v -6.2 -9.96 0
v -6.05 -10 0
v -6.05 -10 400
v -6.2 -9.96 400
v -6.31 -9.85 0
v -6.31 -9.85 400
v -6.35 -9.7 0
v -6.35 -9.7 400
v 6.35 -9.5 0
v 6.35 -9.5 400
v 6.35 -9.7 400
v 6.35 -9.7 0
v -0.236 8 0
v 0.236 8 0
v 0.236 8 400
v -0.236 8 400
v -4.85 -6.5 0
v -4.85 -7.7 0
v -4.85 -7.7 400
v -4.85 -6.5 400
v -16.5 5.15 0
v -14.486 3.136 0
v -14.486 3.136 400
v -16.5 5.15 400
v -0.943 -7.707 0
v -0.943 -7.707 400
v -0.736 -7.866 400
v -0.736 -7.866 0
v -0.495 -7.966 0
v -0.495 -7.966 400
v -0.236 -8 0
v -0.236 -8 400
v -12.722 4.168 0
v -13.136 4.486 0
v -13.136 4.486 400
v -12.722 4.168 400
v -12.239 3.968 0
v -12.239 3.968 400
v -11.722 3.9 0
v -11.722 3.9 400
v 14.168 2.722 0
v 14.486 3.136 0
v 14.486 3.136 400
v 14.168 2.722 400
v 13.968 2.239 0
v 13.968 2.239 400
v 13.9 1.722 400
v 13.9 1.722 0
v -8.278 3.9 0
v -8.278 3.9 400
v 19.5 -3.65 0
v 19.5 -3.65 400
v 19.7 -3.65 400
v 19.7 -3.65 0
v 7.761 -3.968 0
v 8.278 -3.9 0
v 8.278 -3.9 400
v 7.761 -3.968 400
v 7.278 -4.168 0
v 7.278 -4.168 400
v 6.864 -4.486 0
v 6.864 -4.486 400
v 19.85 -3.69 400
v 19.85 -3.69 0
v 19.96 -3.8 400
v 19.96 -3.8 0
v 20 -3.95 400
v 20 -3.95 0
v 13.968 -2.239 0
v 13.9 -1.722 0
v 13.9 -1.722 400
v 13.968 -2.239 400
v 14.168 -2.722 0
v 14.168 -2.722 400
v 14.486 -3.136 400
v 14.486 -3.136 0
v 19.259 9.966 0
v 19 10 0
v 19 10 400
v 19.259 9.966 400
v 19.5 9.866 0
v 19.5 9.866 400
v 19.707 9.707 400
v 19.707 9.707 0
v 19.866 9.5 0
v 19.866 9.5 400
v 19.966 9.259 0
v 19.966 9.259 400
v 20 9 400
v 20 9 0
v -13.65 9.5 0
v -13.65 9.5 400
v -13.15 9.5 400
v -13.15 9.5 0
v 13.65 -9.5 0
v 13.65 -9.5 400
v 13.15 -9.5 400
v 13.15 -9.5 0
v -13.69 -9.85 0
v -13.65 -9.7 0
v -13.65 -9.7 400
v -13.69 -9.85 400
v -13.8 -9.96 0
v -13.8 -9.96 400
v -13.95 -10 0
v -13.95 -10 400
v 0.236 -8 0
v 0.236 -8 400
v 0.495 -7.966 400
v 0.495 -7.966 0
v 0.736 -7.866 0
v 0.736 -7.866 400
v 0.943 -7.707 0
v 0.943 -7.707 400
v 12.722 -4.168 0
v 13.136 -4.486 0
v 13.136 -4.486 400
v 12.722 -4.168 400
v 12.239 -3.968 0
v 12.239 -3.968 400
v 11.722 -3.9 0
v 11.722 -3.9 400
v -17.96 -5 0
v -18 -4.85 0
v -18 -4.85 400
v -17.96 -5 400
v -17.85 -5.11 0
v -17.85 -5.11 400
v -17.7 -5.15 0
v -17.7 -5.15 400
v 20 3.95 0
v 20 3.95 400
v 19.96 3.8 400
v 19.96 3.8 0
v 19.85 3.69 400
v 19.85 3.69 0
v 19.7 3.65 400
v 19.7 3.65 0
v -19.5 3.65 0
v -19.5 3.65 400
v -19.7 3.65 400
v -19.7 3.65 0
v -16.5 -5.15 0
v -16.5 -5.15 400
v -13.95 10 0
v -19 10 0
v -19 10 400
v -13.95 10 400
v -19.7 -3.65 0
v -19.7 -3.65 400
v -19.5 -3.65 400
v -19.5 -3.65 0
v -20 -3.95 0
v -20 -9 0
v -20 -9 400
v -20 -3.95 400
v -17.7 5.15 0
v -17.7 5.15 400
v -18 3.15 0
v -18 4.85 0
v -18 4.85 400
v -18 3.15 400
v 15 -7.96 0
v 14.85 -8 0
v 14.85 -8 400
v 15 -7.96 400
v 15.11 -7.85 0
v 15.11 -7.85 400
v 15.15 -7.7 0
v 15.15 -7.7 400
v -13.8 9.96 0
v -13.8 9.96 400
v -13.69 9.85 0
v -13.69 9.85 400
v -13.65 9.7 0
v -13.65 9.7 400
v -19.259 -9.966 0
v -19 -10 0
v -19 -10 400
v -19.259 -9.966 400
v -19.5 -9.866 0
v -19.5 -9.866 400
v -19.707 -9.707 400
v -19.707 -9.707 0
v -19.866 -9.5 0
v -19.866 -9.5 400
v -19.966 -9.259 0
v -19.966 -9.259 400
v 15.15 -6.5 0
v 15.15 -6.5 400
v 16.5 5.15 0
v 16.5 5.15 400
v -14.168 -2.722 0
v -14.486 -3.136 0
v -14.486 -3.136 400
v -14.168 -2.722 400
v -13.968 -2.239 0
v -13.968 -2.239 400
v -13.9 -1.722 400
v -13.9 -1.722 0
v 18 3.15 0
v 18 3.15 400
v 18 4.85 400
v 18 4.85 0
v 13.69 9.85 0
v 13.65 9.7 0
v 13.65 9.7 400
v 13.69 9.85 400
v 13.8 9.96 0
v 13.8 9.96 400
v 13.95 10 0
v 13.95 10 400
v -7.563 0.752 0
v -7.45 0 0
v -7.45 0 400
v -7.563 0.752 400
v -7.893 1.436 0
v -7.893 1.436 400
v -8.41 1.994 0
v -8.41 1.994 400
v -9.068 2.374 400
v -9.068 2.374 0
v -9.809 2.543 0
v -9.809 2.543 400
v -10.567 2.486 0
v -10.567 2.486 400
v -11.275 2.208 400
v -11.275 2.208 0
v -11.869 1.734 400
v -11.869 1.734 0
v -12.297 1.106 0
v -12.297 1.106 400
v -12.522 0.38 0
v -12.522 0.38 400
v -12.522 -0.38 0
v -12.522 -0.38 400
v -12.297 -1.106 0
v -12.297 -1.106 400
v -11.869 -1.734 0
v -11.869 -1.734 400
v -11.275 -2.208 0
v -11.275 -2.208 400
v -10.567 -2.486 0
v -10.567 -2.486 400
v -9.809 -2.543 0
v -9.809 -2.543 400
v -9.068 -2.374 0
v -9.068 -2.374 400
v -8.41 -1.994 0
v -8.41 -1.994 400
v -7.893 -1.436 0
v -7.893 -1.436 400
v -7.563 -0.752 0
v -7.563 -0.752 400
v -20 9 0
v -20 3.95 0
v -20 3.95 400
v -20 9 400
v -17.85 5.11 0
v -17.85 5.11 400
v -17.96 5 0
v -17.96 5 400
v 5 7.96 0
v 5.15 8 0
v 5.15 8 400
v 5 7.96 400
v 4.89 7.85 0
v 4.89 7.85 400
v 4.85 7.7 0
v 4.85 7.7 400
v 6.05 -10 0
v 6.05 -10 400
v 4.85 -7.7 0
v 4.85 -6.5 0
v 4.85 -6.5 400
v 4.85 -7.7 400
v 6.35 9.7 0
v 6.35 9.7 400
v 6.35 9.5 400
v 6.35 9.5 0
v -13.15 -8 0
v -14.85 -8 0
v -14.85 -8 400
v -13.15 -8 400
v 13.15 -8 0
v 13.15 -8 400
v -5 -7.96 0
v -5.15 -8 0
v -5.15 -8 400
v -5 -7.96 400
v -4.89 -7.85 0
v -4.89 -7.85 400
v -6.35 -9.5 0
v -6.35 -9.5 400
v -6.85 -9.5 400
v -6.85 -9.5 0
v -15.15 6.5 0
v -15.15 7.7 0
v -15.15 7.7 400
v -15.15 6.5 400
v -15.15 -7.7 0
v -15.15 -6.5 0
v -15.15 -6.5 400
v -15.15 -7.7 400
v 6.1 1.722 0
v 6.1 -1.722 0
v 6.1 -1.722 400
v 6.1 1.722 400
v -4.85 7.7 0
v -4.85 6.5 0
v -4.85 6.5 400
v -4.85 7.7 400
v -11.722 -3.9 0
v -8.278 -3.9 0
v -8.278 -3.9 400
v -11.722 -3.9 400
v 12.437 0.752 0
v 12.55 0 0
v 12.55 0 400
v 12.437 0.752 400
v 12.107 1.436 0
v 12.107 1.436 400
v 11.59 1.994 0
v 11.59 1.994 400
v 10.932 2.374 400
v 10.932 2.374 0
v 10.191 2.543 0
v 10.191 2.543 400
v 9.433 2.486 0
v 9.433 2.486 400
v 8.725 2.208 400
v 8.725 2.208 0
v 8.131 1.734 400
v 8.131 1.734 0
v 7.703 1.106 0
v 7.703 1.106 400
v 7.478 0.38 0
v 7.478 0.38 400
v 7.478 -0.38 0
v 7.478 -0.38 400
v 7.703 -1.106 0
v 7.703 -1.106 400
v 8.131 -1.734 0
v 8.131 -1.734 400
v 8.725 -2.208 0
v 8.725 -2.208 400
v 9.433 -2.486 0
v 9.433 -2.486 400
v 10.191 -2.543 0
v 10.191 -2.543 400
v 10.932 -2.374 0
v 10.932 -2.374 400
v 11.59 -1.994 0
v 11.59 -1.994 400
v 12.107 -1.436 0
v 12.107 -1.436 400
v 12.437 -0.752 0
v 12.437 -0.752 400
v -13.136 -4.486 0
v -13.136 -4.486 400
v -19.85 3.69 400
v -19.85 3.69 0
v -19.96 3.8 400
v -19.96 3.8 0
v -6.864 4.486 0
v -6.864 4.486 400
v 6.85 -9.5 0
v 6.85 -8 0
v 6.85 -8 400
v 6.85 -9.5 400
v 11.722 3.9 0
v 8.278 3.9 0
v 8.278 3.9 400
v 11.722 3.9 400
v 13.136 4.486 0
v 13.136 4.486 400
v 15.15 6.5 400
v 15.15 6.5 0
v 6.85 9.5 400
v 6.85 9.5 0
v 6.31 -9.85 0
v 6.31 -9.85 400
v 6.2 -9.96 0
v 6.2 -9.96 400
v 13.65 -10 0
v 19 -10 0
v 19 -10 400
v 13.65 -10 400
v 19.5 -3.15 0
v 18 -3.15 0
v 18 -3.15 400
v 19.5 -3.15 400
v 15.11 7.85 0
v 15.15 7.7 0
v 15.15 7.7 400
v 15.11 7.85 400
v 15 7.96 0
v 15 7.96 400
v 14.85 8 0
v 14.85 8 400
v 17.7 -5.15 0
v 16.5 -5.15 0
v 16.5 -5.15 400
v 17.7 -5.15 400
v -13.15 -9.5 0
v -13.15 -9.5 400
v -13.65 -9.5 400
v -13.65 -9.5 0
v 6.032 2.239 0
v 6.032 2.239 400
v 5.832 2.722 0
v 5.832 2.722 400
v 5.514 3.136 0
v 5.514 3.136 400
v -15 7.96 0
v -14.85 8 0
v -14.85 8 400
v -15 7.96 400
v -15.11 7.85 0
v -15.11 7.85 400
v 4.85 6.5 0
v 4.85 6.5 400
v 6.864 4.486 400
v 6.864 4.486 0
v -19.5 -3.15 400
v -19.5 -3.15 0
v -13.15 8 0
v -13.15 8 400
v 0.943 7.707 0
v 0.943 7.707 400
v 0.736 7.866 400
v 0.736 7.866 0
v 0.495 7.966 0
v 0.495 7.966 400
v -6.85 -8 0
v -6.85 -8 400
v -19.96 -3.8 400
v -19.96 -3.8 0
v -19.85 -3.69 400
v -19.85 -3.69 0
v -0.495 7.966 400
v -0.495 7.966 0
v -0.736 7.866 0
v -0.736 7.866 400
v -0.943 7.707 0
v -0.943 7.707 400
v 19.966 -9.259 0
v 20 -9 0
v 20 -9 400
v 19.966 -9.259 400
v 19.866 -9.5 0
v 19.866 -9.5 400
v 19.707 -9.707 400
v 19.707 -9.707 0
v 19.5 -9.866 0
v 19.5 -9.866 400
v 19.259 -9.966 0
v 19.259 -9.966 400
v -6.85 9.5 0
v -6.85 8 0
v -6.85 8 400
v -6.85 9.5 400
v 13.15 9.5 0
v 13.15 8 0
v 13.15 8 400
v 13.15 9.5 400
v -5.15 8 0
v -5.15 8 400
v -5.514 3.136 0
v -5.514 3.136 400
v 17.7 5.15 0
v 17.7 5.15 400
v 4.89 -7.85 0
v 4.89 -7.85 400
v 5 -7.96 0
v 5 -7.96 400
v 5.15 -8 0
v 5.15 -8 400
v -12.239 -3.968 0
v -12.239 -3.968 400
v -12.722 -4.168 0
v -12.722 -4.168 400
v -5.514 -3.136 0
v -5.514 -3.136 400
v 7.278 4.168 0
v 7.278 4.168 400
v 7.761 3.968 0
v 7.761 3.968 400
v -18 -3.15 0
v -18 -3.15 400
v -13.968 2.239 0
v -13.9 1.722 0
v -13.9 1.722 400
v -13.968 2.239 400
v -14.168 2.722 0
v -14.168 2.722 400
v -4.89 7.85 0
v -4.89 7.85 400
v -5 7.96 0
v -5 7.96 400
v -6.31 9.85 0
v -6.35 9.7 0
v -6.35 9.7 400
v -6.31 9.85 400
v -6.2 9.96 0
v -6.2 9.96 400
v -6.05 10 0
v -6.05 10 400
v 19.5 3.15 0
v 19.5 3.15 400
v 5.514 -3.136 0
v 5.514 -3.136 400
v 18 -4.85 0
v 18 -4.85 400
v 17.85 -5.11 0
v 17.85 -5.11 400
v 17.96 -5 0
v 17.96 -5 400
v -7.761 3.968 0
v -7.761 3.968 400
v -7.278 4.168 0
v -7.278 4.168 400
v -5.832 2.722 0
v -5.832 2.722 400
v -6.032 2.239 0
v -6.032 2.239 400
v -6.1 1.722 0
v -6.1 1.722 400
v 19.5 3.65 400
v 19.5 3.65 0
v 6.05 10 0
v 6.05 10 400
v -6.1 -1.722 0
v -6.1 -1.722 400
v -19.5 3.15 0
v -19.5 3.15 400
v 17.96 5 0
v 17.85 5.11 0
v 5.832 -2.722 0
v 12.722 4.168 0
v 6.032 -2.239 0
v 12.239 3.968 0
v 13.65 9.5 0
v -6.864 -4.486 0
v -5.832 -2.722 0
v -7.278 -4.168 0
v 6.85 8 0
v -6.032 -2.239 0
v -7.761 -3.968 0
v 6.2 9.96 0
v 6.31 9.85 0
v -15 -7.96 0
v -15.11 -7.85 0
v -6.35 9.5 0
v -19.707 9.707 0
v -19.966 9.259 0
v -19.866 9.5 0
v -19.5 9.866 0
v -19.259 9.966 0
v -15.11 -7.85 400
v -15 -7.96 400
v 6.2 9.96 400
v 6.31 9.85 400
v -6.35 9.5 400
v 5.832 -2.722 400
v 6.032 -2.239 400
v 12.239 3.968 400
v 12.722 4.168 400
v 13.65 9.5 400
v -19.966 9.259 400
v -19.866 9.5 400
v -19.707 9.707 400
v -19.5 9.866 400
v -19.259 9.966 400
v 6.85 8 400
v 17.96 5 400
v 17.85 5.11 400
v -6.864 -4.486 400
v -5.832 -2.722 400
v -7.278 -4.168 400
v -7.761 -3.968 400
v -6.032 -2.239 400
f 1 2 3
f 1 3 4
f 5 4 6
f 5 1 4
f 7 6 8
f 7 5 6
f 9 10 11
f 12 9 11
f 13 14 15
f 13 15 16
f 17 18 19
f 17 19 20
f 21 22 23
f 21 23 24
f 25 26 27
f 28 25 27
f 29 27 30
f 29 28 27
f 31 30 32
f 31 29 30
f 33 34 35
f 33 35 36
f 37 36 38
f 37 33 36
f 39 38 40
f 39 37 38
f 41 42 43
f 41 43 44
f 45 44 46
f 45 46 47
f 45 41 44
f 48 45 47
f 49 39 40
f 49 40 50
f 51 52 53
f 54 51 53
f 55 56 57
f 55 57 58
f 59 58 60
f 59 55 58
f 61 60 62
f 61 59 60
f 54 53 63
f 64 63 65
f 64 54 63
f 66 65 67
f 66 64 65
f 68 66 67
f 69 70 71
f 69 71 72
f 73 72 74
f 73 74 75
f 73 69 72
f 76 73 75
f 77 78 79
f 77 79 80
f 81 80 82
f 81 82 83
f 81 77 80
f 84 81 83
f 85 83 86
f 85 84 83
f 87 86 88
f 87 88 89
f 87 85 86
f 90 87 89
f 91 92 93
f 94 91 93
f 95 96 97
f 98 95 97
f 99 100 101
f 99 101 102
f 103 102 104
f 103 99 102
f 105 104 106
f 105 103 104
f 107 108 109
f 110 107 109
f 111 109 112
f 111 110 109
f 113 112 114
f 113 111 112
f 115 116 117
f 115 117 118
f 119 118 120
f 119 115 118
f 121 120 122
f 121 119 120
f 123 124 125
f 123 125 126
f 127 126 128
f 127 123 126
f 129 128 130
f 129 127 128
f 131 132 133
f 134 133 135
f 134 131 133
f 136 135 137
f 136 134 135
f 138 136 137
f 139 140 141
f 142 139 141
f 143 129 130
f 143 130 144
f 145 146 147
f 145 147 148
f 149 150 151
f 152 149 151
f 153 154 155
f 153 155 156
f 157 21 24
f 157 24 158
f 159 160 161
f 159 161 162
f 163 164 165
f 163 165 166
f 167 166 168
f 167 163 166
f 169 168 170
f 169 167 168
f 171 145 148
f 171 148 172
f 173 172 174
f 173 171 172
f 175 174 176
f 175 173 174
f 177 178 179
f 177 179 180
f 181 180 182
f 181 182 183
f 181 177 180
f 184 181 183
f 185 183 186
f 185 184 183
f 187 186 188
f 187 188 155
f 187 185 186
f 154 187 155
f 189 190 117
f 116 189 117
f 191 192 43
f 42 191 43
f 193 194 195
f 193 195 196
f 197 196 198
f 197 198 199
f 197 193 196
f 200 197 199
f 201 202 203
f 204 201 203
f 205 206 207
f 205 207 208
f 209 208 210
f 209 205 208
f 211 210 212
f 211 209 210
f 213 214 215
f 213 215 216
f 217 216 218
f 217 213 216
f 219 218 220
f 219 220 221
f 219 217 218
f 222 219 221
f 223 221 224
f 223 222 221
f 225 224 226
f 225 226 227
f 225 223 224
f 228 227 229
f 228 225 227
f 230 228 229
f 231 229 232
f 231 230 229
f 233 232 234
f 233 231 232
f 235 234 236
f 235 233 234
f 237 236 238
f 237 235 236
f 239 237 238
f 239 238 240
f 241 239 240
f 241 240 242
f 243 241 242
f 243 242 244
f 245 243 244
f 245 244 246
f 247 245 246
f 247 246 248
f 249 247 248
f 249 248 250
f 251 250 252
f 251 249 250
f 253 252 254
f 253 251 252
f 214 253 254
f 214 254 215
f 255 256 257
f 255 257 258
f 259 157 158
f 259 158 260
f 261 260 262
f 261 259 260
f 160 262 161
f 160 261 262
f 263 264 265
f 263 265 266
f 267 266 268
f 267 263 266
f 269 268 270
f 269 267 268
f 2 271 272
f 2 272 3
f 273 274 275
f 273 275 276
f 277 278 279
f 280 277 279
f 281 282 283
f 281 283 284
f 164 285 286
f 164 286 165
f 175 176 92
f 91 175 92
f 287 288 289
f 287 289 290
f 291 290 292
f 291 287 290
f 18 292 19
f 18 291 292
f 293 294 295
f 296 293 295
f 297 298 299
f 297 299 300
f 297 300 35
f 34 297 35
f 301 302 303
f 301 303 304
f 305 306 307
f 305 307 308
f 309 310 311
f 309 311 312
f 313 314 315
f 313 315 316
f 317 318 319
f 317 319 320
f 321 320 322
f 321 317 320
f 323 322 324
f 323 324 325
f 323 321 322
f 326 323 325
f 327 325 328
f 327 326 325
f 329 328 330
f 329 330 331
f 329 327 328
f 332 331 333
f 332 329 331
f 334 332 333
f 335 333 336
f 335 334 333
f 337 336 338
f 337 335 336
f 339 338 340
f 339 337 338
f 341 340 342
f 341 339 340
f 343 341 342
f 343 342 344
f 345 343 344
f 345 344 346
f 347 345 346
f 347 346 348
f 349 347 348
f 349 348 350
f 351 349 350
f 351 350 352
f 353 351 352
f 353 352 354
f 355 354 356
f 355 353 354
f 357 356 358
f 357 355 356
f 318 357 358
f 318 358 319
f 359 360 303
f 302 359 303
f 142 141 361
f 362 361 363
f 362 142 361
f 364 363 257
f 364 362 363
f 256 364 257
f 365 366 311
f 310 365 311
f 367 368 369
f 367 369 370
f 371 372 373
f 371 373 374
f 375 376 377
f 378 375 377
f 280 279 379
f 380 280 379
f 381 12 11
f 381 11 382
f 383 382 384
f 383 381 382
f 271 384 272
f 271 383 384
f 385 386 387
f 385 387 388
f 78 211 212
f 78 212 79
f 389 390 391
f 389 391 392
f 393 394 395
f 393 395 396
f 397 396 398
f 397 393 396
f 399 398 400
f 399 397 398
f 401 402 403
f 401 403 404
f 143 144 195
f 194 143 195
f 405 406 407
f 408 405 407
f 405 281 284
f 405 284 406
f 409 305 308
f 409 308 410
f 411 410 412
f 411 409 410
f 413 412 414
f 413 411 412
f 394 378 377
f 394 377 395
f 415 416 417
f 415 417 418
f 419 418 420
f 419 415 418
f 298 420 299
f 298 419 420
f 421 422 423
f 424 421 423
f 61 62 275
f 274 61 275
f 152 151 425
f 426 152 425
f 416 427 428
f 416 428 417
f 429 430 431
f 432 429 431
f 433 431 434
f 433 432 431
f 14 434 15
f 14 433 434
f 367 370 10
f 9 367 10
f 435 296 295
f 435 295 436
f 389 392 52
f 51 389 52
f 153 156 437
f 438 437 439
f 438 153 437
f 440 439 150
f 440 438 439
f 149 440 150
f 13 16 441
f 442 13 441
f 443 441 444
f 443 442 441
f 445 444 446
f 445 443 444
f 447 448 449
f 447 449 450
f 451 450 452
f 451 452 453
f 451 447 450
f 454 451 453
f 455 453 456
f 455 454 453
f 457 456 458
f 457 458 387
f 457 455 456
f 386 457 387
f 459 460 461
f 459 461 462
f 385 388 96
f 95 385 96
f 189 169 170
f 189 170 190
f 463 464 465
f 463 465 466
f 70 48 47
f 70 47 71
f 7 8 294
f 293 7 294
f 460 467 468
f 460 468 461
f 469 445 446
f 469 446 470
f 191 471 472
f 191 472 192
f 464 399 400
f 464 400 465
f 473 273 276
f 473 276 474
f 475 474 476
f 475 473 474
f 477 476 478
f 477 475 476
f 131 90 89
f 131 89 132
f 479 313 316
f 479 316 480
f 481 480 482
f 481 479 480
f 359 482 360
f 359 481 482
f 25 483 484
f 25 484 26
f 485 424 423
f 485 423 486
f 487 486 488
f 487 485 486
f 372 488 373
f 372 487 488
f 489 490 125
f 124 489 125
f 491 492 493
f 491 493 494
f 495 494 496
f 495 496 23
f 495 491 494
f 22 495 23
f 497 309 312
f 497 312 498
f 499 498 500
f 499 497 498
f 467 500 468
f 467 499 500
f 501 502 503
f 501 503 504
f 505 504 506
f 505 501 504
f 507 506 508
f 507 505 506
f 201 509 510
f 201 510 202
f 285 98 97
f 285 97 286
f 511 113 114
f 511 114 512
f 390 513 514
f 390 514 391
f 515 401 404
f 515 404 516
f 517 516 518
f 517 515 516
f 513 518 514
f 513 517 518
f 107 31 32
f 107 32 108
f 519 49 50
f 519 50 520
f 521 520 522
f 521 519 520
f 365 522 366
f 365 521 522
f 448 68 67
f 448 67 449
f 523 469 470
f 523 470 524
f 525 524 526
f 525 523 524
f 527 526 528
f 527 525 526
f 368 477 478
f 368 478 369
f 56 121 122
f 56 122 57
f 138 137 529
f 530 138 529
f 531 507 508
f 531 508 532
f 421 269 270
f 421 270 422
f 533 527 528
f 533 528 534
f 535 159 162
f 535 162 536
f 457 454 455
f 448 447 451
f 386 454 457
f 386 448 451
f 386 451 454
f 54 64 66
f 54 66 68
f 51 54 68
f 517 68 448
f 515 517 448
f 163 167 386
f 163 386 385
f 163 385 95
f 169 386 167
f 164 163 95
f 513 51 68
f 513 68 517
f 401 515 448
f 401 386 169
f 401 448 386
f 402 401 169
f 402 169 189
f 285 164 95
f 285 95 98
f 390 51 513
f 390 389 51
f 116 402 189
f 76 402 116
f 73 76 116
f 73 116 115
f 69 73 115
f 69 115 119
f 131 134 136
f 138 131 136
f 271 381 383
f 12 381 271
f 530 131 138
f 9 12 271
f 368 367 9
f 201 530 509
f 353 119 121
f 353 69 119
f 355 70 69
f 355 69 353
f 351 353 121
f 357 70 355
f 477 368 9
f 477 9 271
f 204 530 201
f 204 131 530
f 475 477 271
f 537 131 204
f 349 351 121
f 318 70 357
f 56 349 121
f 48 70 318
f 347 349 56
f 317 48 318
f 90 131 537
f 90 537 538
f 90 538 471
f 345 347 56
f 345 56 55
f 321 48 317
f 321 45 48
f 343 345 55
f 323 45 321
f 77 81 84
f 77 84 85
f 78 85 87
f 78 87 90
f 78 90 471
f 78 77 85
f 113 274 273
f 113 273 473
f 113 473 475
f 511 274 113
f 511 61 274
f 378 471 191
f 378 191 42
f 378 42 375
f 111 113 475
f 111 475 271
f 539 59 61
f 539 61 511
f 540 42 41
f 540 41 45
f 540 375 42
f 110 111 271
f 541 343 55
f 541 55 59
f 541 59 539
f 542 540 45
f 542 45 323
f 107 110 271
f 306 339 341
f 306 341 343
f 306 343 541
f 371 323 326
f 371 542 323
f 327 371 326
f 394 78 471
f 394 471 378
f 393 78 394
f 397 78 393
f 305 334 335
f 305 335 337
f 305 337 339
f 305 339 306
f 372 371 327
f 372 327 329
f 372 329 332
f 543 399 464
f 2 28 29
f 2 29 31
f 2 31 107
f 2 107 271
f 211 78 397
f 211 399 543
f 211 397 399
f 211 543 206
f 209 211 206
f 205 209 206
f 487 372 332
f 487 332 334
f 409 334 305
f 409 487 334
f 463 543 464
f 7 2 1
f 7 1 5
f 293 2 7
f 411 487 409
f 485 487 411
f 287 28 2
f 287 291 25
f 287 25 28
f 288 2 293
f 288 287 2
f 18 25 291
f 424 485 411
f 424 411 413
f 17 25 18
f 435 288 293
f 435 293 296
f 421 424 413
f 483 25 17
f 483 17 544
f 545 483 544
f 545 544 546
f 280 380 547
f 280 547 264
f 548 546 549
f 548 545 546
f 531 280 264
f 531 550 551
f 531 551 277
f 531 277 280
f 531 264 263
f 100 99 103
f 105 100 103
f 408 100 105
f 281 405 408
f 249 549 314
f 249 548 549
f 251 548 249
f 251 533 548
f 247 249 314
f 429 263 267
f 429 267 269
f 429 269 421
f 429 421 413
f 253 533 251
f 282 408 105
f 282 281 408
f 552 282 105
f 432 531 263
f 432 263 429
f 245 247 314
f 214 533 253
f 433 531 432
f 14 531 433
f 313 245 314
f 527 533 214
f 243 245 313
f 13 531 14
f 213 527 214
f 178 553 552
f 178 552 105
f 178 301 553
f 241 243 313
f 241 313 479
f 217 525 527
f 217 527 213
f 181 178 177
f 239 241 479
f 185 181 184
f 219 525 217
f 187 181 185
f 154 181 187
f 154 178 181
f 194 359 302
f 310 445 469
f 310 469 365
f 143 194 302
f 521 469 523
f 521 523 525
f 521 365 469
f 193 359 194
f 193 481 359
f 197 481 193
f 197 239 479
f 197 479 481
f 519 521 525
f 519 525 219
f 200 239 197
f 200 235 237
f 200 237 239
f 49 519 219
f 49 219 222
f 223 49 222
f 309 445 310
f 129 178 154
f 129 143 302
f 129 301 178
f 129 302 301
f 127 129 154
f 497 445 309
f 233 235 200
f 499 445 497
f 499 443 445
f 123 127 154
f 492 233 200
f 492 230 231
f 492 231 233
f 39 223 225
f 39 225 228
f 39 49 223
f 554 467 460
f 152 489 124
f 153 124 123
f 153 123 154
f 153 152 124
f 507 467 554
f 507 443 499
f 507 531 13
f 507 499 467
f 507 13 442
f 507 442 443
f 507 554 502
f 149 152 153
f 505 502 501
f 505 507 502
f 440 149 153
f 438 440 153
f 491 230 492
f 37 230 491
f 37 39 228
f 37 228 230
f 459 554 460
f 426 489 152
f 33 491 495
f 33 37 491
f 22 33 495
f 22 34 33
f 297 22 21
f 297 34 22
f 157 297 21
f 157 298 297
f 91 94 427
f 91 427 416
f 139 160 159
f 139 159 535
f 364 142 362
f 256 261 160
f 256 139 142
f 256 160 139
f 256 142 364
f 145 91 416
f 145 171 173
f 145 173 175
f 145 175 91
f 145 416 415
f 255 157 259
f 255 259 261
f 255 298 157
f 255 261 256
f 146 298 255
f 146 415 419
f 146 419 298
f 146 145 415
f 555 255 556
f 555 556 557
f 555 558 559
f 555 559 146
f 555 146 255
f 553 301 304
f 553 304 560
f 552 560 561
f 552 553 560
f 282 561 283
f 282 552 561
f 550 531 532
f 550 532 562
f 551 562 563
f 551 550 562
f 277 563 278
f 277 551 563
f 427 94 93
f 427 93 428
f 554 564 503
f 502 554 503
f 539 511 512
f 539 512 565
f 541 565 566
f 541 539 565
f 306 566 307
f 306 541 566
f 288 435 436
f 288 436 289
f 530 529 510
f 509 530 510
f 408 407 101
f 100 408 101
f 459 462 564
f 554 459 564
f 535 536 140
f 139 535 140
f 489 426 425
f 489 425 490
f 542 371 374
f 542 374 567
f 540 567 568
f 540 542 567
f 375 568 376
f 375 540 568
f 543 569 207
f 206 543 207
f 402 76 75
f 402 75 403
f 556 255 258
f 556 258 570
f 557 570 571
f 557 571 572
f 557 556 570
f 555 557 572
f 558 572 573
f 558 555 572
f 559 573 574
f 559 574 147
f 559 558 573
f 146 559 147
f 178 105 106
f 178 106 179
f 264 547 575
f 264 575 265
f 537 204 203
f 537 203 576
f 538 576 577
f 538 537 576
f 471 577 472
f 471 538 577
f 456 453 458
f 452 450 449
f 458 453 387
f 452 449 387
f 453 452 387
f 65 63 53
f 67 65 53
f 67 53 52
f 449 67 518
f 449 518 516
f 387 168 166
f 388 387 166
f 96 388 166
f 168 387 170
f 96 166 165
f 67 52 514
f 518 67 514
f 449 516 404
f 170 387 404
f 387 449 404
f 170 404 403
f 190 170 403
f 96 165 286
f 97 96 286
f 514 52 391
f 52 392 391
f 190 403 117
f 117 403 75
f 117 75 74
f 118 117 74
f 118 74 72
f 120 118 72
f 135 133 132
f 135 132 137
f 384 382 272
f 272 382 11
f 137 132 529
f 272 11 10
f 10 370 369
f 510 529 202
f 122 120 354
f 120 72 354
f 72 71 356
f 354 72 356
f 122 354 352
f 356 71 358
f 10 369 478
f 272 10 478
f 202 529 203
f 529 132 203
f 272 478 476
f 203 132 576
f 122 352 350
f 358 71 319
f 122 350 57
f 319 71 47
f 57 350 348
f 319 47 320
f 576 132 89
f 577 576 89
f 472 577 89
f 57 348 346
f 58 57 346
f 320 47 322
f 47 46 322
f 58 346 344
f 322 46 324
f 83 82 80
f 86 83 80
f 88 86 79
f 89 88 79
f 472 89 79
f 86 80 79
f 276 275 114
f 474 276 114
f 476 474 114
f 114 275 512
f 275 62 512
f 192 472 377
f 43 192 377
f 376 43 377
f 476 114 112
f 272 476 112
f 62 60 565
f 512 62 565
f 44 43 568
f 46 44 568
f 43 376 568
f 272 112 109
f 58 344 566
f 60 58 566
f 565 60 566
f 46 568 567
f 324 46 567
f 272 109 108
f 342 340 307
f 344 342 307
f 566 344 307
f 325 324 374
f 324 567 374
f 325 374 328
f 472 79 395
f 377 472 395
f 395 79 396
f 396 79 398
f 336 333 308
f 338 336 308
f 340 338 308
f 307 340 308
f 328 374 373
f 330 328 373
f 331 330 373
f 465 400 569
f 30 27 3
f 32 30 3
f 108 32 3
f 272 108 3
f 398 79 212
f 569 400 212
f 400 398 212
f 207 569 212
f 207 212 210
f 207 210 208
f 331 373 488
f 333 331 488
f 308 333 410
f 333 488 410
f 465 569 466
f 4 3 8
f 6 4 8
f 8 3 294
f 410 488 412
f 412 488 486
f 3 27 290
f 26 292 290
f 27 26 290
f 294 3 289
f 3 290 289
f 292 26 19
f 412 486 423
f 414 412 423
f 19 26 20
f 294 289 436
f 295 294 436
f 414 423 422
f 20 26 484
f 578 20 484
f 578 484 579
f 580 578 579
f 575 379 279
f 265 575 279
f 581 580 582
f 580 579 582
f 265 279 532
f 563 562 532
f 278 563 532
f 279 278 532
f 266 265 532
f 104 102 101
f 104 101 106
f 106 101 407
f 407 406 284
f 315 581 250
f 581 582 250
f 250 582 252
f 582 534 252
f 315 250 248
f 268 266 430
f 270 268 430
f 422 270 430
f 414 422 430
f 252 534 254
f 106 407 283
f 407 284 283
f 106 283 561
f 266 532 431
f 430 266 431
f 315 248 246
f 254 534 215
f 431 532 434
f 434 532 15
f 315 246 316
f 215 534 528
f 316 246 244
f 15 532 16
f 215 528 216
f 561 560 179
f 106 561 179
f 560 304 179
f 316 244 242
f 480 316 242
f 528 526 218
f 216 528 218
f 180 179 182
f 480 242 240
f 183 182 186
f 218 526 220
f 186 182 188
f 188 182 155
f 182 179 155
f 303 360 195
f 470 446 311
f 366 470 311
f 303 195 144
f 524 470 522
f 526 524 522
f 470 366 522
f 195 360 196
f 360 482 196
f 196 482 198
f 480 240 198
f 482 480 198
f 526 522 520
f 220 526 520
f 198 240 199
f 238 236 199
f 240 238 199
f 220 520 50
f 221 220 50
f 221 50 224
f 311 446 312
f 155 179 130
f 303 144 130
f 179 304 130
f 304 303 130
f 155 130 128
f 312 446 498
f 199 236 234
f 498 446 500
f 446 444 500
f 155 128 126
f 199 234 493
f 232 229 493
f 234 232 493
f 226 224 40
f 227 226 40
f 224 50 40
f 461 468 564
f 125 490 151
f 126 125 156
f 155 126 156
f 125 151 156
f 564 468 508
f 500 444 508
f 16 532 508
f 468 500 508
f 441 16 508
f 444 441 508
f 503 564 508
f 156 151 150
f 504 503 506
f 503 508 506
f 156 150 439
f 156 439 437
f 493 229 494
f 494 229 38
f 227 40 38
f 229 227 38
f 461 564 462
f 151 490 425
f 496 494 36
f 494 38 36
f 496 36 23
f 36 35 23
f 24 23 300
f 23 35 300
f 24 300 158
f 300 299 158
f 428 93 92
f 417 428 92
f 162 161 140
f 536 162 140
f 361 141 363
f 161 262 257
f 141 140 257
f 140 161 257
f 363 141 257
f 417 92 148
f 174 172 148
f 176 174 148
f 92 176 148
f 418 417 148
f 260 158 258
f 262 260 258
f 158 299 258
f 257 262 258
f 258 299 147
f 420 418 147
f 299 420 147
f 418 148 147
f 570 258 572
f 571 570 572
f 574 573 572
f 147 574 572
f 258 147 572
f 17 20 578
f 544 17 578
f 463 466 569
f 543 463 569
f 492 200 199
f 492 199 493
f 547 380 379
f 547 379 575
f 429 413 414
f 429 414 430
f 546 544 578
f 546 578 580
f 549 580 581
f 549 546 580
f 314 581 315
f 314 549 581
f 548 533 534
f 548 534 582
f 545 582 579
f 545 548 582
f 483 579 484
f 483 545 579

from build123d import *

# Parameters (mm, degrees)
CROQUIS1_R              = 2.55
SALIENTE_EXTRUIR1_DEPTH = 400


with BuildPart() as part:
    # Croquis1 → Saliente-Extruir1 (new body)
    with BuildSketch(Plane.XY):
        with BuildLine():
            Line((-20, -9), (-20, -3.95))
            ThreePointArc((-20, -3.95), (-19.912132034, -3.737867966), (-19.7, -3.65))
            Line((-19.7, -3.65), (-19.5, -3.65))
            Line((-19.5, -3.65), (-19.5, -3.15))
            Line((-19.5, -3.15), (-18, -3.15))
            Line((-18, -3.15), (-18, -4.85))
            ThreePointArc((-18, -4.85), (-17.912132034, -5.062132034), (-17.7, -5.15))
            Line((-17.7, -5.15), (-16.5, -5.15))
            Line((-16.5, -5.15), (-14.485786438, -3.135786438))
            ThreePointArc((-14.485786438, -3.135786438), (-14.052240935, -2.48693974), (-13.9, -1.721572875))
            Line((-13.9, -1.721572875), (-13.9, 1.721572875))
            ThreePointArc((-13.9, 1.721572875), (-14.052240935, 2.48693974), (-14.485786438, 3.135786438))
            Line((-14.485786438, 3.135786438), (-16.5, 5.15))
            Line((-16.5, 5.15), (-17.7, 5.15))
            ThreePointArc((-17.7, 5.15), (-17.912132034, 5.062132034), (-18, 4.85))
            Line((-18, 4.85), (-18, 3.15))
            Line((-18, 3.15), (-19.5, 3.15))
            Line((-19.5, 3.15), (-19.5, 3.65))
            Line((-19.5, 3.65), (-19.7, 3.65))
            ThreePointArc((-19.7, 3.65), (-19.912132034, 3.737867966), (-20, 3.95))
            Line((-20, 3.95), (-20, 9))
            ThreePointArc((-20, 9), (-19.707106781, 9.707106781), (-19, 10))
            Line((-19, 10), (-13.95, 10))
            ThreePointArc((-13.95, 10), (-13.737867966, 9.912132034), (-13.65, 9.7))
            Line((-13.65, 9.7), (-13.65, 9.5))
            Line((-13.65, 9.5), (-13.15, 9.5))
            Line((-13.15, 9.5), (-13.15, 8))
            Line((-13.15, 8), (-14.85, 8))
            ThreePointArc((-14.85, 8), (-15.062132034, 7.912132034), (-15.15, 7.7))
            Line((-15.15, 7.7), (-15.15, 6.5))
            Line((-15.15, 6.5), (-13.135786438, 4.485786438))
            ThreePointArc((-13.135786438, 4.485786438), (-12.48693974, 4.052240935), (-11.721572875, 3.9))
            Line((-11.721572875, 3.9), (-8.278427125, 3.9))
            ThreePointArc((-8.278427125, 3.9), (-7.51306026, 4.052240935), (-6.864213562, 4.485786438))
            Line((-6.864213562, 4.485786438), (-4.85, 6.5))
            Line((-4.85, 6.5), (-4.85, 7.7))
            ThreePointArc((-4.85, 7.7), (-4.937867966, 7.912132034), (-5.15, 8))
            Line((-5.15, 8), (-6.85, 8))
            Line((-6.85, 8), (-6.85, 9.5))
            Line((-6.85, 9.5), (-6.35, 9.5))
            Line((-6.35, 9.5), (-6.35, 9.7))
            ThreePointArc((-6.35, 9.7), (-6.262132034, 9.912132034), (-6.05, 10))
            Line((-6.05, 10), (6.05, 10))
            ThreePointArc((6.05, 10), (6.262132034, 9.912132034), (6.35, 9.7))
            Line((6.35, 9.7), (6.35, 9.5))
            Line((6.35, 9.5), (6.85, 9.5))
            Line((6.85, 9.5), (6.85, 8))
            Line((6.85, 8), (5.15, 8))
            ThreePointArc((5.15, 8), (4.937867966, 7.912132034), (4.85, 7.7))
            Line((4.85, 7.7), (4.85, 6.5))
            Line((4.85, 6.5), (6.864213562, 4.485786438))
            ThreePointArc((6.864213562, 4.485786438), (7.51306026, 4.052240935), (8.278427125, 3.9))
            Line((8.278427125, 3.9), (11.721572875, 3.9))
            ThreePointArc((11.721572875, 3.9), (12.48693974, 4.052240935), (13.135786438, 4.485786438))
            Line((13.135786438, 4.485786438), (15.15, 6.5))
            Line((15.15, 6.5), (15.15, 7.7))
            ThreePointArc((15.15, 7.7), (15.062132034, 7.912132034), (14.85, 8))
            Line((14.85, 8), (13.15, 8))
            Line((13.15, 8), (13.15, 9.5))
            Line((13.15, 9.5), (13.65, 9.5))
            Line((13.65, 9.5), (13.65, 9.7))
            ThreePointArc((13.65, 9.7), (13.737867966, 9.912132034), (13.95, 10))
            Line((13.95, 10), (19, 10))
            ThreePointArc((19, 10), (19.707106781, 9.707106781), (20, 9))
            Line((20, 9), (20, 3.95))
            ThreePointArc((20, 3.95), (19.912132034, 3.737867966), (19.7, 3.65))
            Line((19.7, 3.65), (19.5, 3.65))
            Line((19.5, 3.65), (19.5, 3.15))
            Line((19.5, 3.15), (18, 3.15))
            Line((18, 3.15), (18, 4.85))
            ThreePointArc((18, 4.85), (17.912132034, 5.062132034), (17.7, 5.15))
            Line((17.7, 5.15), (16.5, 5.15))
            Line((16.5, 5.15), (14.485786438, 3.135786438))
            ThreePointArc((14.485786438, 3.135786438), (14.052240935, 2.48693974), (13.9, 1.721572875))
            Line((13.9, 1.721572875), (13.9, -1.721572875))
            ThreePointArc((13.9, -1.721572875), (14.052240935, -2.48693974), (14.485786438, -3.135786438))
            Line((14.485786438, -3.135786438), (16.5, -5.15))
            Line((16.5, -5.15), (17.7, -5.15))
            ThreePointArc((17.7, -5.15), (17.912132034, -5.062132034), (18, -4.85))
            Line((18, -4.85), (18, -3.15))
            Line((18, -3.15), (19.5, -3.15))
            Line((19.5, -3.15), (19.5, -3.65))
            Line((19.5, -3.65), (19.7, -3.65))
            ThreePointArc((19.7, -3.65), (19.912132034, -3.737867966), (20, -3.95))
            Line((20, -3.95), (20, -9))
            ThreePointArc((20, -9), (19.707106781, -9.707106781), (19, -10))
            Line((19, -10), (13.65, -10))
            Line((13.65, -10), (13.65, -9.5))
            Line((13.65, -9.5), (13.15, -9.5))
            Line((13.15, -9.5), (13.15, -8))
            Line((13.15, -8), (14.85, -8))
            ThreePointArc((14.85, -8), (15.062132034, -7.912132034), (15.15, -7.7))
            Line((15.15, -7.7), (15.15, -6.5))
            Line((15.15, -6.5), (13.135786438, -4.485786438))
            ThreePointArc((13.135786438, -4.485786438), (12.48693974, -4.052240935), (11.721572875, -3.9))
            Line((11.721572875, -3.9), (8.278427125, -3.9))
            ThreePointArc((8.278427125, -3.9), (7.51306026, -4.052240935), (6.864213562, -4.485786438))
            Line((6.864213562, -4.485786438), (4.85, -6.5))
            Line((4.85, -6.5), (4.85, -7.7))
            ThreePointArc((4.85, -7.7), (4.937867966, -7.912132034), (5.15, -8))
            Line((5.15, -8), (6.85, -8))
            Line((6.85, -8), (6.85, -9.5))
            Line((6.85, -9.5), (6.35, -9.5))
            Line((6.35, -9.5), (6.35, -9.7))
            ThreePointArc((6.35, -9.7), (6.262132034, -9.912132034), (6.05, -10))
            Line((6.05, -10), (0, -10))
            Line((0, -10), (-6.05, -10))
            ThreePointArc((-6.05, -10), (-6.262132034, -9.912132034), (-6.35, -9.7))
            Line((-6.35, -9.7), (-6.35, -9.5))
            Line((-6.35, -9.5), (-6.85, -9.5))
            Line((-6.85, -9.5), (-6.85, -8))
            Line((-6.85, -8), (-5.15, -8))
            ThreePointArc((-5.15, -8), (-4.937867966, -7.912132034), (-4.85, -7.7))
            Line((-4.85, -7.7), (-4.85, -6.5))
            Line((-4.85, -6.5), (-6.864213562, -4.485786438))
            ThreePointArc((-6.864213562, -4.485786438), (-7.51306026, -4.052240935), (-8.278427125, -3.9))
            Line((-8.278427125, -3.9), (-11.721572875, -3.9))
            ThreePointArc((-11.721572875, -3.9), (-12.48693974, -4.052240935), (-13.135786438, -4.485786438))
            Line((-13.135786438, -4.485786438), (-15.15, -6.5))
            Line((-15.15, -6.5), (-15.15, -7.7))
            ThreePointArc((-15.15, -7.7), (-15.062132034, -7.912132034), (-14.85, -8))
            Line((-14.85, -8), (-13.15, -8))
            Line((-13.15, -8), (-13.15, -9.5))
            Line((-13.15, -9.5), (-13.65, -9.5))
            Line((-13.65, -9.5), (-13.65, -9.7))
            ThreePointArc((-13.65, -9.7), (-13.737867966, -9.912132034), (-13.95, -10))
            Line((-13.95, -10), (-19, -10))
            ThreePointArc((-19, -10), (-19.707106781, -9.707106781), (-20, -9))
        make_face()
        with Locations((-10, 0)):
            Circle(CROQUIS1_R, mode=Mode.SUBTRACT)
        with Locations((10, 0)):
            Circle(CROQUIS1_R, mode=Mode.SUBTRACT)
        with BuildLine():
            Line((-6.1, 1.721572875), (-6.1, -1.721572875))
            ThreePointArc((-6.1, -1.721572875), (-5.947759065, -2.48693974), (-5.514213562, -3.135786438))
            Line((-5.514213562, -3.135786438), (-3.5, -5.15))
            Line((-3.5, -5.15), (-0.942893219, -7.707106781))
            ThreePointArc((-0.942893219, -7.707106781), (-0.61846987, -7.923879533), (-0.235786438, -8))
            Line((-0.235786438, -8), (0.235786438, -8))
            ThreePointArc((0.235786438, -8), (0.61846987, -7.923879533), (0.942893219, -7.707106781))
            Line((0.942893219, -7.707106781), (3.5, -5.15))
            Line((3.5, -5.15), (5.514213562, -3.135786438))
            ThreePointArc((5.514213562, -3.135786438), (5.947759065, -2.48693974), (6.1, -1.721572875))
            Line((6.1, -1.721572875), (6.1, 1.721572875))
            ThreePointArc((6.1, 1.721572875), (5.947759065, 2.48693974), (5.514213562, 3.135786438))
            Line((5.514213562, 3.135786438), (3.5, 5.15))
            Line((3.5, 5.15), (0.942893219, 7.707106781))
            ThreePointArc((0.942893219, 7.707106781), (0.61846987, 7.923879533), (0.235786438, 8))
            Line((0.235786438, 8), (-0.235786438, 8))
            ThreePointArc((-0.235786438, 8), (-0.61846987, 7.923879533), (-0.942893219, 7.707106781))
            Line((-0.942893219, 7.707106781), (-3.5, 5.15))
            Line((-3.5, 5.15), (-5.514213562, 3.135786438))
            ThreePointArc((-5.514213562, 3.135786438), (-5.947759065, 2.48693974), (-6.1, 1.721572875))
        make_face(mode=Mode.SUBTRACT)
    extrude(amount=SALIENTE_EXTRUIR1_DEPTH)


solid = part.part
